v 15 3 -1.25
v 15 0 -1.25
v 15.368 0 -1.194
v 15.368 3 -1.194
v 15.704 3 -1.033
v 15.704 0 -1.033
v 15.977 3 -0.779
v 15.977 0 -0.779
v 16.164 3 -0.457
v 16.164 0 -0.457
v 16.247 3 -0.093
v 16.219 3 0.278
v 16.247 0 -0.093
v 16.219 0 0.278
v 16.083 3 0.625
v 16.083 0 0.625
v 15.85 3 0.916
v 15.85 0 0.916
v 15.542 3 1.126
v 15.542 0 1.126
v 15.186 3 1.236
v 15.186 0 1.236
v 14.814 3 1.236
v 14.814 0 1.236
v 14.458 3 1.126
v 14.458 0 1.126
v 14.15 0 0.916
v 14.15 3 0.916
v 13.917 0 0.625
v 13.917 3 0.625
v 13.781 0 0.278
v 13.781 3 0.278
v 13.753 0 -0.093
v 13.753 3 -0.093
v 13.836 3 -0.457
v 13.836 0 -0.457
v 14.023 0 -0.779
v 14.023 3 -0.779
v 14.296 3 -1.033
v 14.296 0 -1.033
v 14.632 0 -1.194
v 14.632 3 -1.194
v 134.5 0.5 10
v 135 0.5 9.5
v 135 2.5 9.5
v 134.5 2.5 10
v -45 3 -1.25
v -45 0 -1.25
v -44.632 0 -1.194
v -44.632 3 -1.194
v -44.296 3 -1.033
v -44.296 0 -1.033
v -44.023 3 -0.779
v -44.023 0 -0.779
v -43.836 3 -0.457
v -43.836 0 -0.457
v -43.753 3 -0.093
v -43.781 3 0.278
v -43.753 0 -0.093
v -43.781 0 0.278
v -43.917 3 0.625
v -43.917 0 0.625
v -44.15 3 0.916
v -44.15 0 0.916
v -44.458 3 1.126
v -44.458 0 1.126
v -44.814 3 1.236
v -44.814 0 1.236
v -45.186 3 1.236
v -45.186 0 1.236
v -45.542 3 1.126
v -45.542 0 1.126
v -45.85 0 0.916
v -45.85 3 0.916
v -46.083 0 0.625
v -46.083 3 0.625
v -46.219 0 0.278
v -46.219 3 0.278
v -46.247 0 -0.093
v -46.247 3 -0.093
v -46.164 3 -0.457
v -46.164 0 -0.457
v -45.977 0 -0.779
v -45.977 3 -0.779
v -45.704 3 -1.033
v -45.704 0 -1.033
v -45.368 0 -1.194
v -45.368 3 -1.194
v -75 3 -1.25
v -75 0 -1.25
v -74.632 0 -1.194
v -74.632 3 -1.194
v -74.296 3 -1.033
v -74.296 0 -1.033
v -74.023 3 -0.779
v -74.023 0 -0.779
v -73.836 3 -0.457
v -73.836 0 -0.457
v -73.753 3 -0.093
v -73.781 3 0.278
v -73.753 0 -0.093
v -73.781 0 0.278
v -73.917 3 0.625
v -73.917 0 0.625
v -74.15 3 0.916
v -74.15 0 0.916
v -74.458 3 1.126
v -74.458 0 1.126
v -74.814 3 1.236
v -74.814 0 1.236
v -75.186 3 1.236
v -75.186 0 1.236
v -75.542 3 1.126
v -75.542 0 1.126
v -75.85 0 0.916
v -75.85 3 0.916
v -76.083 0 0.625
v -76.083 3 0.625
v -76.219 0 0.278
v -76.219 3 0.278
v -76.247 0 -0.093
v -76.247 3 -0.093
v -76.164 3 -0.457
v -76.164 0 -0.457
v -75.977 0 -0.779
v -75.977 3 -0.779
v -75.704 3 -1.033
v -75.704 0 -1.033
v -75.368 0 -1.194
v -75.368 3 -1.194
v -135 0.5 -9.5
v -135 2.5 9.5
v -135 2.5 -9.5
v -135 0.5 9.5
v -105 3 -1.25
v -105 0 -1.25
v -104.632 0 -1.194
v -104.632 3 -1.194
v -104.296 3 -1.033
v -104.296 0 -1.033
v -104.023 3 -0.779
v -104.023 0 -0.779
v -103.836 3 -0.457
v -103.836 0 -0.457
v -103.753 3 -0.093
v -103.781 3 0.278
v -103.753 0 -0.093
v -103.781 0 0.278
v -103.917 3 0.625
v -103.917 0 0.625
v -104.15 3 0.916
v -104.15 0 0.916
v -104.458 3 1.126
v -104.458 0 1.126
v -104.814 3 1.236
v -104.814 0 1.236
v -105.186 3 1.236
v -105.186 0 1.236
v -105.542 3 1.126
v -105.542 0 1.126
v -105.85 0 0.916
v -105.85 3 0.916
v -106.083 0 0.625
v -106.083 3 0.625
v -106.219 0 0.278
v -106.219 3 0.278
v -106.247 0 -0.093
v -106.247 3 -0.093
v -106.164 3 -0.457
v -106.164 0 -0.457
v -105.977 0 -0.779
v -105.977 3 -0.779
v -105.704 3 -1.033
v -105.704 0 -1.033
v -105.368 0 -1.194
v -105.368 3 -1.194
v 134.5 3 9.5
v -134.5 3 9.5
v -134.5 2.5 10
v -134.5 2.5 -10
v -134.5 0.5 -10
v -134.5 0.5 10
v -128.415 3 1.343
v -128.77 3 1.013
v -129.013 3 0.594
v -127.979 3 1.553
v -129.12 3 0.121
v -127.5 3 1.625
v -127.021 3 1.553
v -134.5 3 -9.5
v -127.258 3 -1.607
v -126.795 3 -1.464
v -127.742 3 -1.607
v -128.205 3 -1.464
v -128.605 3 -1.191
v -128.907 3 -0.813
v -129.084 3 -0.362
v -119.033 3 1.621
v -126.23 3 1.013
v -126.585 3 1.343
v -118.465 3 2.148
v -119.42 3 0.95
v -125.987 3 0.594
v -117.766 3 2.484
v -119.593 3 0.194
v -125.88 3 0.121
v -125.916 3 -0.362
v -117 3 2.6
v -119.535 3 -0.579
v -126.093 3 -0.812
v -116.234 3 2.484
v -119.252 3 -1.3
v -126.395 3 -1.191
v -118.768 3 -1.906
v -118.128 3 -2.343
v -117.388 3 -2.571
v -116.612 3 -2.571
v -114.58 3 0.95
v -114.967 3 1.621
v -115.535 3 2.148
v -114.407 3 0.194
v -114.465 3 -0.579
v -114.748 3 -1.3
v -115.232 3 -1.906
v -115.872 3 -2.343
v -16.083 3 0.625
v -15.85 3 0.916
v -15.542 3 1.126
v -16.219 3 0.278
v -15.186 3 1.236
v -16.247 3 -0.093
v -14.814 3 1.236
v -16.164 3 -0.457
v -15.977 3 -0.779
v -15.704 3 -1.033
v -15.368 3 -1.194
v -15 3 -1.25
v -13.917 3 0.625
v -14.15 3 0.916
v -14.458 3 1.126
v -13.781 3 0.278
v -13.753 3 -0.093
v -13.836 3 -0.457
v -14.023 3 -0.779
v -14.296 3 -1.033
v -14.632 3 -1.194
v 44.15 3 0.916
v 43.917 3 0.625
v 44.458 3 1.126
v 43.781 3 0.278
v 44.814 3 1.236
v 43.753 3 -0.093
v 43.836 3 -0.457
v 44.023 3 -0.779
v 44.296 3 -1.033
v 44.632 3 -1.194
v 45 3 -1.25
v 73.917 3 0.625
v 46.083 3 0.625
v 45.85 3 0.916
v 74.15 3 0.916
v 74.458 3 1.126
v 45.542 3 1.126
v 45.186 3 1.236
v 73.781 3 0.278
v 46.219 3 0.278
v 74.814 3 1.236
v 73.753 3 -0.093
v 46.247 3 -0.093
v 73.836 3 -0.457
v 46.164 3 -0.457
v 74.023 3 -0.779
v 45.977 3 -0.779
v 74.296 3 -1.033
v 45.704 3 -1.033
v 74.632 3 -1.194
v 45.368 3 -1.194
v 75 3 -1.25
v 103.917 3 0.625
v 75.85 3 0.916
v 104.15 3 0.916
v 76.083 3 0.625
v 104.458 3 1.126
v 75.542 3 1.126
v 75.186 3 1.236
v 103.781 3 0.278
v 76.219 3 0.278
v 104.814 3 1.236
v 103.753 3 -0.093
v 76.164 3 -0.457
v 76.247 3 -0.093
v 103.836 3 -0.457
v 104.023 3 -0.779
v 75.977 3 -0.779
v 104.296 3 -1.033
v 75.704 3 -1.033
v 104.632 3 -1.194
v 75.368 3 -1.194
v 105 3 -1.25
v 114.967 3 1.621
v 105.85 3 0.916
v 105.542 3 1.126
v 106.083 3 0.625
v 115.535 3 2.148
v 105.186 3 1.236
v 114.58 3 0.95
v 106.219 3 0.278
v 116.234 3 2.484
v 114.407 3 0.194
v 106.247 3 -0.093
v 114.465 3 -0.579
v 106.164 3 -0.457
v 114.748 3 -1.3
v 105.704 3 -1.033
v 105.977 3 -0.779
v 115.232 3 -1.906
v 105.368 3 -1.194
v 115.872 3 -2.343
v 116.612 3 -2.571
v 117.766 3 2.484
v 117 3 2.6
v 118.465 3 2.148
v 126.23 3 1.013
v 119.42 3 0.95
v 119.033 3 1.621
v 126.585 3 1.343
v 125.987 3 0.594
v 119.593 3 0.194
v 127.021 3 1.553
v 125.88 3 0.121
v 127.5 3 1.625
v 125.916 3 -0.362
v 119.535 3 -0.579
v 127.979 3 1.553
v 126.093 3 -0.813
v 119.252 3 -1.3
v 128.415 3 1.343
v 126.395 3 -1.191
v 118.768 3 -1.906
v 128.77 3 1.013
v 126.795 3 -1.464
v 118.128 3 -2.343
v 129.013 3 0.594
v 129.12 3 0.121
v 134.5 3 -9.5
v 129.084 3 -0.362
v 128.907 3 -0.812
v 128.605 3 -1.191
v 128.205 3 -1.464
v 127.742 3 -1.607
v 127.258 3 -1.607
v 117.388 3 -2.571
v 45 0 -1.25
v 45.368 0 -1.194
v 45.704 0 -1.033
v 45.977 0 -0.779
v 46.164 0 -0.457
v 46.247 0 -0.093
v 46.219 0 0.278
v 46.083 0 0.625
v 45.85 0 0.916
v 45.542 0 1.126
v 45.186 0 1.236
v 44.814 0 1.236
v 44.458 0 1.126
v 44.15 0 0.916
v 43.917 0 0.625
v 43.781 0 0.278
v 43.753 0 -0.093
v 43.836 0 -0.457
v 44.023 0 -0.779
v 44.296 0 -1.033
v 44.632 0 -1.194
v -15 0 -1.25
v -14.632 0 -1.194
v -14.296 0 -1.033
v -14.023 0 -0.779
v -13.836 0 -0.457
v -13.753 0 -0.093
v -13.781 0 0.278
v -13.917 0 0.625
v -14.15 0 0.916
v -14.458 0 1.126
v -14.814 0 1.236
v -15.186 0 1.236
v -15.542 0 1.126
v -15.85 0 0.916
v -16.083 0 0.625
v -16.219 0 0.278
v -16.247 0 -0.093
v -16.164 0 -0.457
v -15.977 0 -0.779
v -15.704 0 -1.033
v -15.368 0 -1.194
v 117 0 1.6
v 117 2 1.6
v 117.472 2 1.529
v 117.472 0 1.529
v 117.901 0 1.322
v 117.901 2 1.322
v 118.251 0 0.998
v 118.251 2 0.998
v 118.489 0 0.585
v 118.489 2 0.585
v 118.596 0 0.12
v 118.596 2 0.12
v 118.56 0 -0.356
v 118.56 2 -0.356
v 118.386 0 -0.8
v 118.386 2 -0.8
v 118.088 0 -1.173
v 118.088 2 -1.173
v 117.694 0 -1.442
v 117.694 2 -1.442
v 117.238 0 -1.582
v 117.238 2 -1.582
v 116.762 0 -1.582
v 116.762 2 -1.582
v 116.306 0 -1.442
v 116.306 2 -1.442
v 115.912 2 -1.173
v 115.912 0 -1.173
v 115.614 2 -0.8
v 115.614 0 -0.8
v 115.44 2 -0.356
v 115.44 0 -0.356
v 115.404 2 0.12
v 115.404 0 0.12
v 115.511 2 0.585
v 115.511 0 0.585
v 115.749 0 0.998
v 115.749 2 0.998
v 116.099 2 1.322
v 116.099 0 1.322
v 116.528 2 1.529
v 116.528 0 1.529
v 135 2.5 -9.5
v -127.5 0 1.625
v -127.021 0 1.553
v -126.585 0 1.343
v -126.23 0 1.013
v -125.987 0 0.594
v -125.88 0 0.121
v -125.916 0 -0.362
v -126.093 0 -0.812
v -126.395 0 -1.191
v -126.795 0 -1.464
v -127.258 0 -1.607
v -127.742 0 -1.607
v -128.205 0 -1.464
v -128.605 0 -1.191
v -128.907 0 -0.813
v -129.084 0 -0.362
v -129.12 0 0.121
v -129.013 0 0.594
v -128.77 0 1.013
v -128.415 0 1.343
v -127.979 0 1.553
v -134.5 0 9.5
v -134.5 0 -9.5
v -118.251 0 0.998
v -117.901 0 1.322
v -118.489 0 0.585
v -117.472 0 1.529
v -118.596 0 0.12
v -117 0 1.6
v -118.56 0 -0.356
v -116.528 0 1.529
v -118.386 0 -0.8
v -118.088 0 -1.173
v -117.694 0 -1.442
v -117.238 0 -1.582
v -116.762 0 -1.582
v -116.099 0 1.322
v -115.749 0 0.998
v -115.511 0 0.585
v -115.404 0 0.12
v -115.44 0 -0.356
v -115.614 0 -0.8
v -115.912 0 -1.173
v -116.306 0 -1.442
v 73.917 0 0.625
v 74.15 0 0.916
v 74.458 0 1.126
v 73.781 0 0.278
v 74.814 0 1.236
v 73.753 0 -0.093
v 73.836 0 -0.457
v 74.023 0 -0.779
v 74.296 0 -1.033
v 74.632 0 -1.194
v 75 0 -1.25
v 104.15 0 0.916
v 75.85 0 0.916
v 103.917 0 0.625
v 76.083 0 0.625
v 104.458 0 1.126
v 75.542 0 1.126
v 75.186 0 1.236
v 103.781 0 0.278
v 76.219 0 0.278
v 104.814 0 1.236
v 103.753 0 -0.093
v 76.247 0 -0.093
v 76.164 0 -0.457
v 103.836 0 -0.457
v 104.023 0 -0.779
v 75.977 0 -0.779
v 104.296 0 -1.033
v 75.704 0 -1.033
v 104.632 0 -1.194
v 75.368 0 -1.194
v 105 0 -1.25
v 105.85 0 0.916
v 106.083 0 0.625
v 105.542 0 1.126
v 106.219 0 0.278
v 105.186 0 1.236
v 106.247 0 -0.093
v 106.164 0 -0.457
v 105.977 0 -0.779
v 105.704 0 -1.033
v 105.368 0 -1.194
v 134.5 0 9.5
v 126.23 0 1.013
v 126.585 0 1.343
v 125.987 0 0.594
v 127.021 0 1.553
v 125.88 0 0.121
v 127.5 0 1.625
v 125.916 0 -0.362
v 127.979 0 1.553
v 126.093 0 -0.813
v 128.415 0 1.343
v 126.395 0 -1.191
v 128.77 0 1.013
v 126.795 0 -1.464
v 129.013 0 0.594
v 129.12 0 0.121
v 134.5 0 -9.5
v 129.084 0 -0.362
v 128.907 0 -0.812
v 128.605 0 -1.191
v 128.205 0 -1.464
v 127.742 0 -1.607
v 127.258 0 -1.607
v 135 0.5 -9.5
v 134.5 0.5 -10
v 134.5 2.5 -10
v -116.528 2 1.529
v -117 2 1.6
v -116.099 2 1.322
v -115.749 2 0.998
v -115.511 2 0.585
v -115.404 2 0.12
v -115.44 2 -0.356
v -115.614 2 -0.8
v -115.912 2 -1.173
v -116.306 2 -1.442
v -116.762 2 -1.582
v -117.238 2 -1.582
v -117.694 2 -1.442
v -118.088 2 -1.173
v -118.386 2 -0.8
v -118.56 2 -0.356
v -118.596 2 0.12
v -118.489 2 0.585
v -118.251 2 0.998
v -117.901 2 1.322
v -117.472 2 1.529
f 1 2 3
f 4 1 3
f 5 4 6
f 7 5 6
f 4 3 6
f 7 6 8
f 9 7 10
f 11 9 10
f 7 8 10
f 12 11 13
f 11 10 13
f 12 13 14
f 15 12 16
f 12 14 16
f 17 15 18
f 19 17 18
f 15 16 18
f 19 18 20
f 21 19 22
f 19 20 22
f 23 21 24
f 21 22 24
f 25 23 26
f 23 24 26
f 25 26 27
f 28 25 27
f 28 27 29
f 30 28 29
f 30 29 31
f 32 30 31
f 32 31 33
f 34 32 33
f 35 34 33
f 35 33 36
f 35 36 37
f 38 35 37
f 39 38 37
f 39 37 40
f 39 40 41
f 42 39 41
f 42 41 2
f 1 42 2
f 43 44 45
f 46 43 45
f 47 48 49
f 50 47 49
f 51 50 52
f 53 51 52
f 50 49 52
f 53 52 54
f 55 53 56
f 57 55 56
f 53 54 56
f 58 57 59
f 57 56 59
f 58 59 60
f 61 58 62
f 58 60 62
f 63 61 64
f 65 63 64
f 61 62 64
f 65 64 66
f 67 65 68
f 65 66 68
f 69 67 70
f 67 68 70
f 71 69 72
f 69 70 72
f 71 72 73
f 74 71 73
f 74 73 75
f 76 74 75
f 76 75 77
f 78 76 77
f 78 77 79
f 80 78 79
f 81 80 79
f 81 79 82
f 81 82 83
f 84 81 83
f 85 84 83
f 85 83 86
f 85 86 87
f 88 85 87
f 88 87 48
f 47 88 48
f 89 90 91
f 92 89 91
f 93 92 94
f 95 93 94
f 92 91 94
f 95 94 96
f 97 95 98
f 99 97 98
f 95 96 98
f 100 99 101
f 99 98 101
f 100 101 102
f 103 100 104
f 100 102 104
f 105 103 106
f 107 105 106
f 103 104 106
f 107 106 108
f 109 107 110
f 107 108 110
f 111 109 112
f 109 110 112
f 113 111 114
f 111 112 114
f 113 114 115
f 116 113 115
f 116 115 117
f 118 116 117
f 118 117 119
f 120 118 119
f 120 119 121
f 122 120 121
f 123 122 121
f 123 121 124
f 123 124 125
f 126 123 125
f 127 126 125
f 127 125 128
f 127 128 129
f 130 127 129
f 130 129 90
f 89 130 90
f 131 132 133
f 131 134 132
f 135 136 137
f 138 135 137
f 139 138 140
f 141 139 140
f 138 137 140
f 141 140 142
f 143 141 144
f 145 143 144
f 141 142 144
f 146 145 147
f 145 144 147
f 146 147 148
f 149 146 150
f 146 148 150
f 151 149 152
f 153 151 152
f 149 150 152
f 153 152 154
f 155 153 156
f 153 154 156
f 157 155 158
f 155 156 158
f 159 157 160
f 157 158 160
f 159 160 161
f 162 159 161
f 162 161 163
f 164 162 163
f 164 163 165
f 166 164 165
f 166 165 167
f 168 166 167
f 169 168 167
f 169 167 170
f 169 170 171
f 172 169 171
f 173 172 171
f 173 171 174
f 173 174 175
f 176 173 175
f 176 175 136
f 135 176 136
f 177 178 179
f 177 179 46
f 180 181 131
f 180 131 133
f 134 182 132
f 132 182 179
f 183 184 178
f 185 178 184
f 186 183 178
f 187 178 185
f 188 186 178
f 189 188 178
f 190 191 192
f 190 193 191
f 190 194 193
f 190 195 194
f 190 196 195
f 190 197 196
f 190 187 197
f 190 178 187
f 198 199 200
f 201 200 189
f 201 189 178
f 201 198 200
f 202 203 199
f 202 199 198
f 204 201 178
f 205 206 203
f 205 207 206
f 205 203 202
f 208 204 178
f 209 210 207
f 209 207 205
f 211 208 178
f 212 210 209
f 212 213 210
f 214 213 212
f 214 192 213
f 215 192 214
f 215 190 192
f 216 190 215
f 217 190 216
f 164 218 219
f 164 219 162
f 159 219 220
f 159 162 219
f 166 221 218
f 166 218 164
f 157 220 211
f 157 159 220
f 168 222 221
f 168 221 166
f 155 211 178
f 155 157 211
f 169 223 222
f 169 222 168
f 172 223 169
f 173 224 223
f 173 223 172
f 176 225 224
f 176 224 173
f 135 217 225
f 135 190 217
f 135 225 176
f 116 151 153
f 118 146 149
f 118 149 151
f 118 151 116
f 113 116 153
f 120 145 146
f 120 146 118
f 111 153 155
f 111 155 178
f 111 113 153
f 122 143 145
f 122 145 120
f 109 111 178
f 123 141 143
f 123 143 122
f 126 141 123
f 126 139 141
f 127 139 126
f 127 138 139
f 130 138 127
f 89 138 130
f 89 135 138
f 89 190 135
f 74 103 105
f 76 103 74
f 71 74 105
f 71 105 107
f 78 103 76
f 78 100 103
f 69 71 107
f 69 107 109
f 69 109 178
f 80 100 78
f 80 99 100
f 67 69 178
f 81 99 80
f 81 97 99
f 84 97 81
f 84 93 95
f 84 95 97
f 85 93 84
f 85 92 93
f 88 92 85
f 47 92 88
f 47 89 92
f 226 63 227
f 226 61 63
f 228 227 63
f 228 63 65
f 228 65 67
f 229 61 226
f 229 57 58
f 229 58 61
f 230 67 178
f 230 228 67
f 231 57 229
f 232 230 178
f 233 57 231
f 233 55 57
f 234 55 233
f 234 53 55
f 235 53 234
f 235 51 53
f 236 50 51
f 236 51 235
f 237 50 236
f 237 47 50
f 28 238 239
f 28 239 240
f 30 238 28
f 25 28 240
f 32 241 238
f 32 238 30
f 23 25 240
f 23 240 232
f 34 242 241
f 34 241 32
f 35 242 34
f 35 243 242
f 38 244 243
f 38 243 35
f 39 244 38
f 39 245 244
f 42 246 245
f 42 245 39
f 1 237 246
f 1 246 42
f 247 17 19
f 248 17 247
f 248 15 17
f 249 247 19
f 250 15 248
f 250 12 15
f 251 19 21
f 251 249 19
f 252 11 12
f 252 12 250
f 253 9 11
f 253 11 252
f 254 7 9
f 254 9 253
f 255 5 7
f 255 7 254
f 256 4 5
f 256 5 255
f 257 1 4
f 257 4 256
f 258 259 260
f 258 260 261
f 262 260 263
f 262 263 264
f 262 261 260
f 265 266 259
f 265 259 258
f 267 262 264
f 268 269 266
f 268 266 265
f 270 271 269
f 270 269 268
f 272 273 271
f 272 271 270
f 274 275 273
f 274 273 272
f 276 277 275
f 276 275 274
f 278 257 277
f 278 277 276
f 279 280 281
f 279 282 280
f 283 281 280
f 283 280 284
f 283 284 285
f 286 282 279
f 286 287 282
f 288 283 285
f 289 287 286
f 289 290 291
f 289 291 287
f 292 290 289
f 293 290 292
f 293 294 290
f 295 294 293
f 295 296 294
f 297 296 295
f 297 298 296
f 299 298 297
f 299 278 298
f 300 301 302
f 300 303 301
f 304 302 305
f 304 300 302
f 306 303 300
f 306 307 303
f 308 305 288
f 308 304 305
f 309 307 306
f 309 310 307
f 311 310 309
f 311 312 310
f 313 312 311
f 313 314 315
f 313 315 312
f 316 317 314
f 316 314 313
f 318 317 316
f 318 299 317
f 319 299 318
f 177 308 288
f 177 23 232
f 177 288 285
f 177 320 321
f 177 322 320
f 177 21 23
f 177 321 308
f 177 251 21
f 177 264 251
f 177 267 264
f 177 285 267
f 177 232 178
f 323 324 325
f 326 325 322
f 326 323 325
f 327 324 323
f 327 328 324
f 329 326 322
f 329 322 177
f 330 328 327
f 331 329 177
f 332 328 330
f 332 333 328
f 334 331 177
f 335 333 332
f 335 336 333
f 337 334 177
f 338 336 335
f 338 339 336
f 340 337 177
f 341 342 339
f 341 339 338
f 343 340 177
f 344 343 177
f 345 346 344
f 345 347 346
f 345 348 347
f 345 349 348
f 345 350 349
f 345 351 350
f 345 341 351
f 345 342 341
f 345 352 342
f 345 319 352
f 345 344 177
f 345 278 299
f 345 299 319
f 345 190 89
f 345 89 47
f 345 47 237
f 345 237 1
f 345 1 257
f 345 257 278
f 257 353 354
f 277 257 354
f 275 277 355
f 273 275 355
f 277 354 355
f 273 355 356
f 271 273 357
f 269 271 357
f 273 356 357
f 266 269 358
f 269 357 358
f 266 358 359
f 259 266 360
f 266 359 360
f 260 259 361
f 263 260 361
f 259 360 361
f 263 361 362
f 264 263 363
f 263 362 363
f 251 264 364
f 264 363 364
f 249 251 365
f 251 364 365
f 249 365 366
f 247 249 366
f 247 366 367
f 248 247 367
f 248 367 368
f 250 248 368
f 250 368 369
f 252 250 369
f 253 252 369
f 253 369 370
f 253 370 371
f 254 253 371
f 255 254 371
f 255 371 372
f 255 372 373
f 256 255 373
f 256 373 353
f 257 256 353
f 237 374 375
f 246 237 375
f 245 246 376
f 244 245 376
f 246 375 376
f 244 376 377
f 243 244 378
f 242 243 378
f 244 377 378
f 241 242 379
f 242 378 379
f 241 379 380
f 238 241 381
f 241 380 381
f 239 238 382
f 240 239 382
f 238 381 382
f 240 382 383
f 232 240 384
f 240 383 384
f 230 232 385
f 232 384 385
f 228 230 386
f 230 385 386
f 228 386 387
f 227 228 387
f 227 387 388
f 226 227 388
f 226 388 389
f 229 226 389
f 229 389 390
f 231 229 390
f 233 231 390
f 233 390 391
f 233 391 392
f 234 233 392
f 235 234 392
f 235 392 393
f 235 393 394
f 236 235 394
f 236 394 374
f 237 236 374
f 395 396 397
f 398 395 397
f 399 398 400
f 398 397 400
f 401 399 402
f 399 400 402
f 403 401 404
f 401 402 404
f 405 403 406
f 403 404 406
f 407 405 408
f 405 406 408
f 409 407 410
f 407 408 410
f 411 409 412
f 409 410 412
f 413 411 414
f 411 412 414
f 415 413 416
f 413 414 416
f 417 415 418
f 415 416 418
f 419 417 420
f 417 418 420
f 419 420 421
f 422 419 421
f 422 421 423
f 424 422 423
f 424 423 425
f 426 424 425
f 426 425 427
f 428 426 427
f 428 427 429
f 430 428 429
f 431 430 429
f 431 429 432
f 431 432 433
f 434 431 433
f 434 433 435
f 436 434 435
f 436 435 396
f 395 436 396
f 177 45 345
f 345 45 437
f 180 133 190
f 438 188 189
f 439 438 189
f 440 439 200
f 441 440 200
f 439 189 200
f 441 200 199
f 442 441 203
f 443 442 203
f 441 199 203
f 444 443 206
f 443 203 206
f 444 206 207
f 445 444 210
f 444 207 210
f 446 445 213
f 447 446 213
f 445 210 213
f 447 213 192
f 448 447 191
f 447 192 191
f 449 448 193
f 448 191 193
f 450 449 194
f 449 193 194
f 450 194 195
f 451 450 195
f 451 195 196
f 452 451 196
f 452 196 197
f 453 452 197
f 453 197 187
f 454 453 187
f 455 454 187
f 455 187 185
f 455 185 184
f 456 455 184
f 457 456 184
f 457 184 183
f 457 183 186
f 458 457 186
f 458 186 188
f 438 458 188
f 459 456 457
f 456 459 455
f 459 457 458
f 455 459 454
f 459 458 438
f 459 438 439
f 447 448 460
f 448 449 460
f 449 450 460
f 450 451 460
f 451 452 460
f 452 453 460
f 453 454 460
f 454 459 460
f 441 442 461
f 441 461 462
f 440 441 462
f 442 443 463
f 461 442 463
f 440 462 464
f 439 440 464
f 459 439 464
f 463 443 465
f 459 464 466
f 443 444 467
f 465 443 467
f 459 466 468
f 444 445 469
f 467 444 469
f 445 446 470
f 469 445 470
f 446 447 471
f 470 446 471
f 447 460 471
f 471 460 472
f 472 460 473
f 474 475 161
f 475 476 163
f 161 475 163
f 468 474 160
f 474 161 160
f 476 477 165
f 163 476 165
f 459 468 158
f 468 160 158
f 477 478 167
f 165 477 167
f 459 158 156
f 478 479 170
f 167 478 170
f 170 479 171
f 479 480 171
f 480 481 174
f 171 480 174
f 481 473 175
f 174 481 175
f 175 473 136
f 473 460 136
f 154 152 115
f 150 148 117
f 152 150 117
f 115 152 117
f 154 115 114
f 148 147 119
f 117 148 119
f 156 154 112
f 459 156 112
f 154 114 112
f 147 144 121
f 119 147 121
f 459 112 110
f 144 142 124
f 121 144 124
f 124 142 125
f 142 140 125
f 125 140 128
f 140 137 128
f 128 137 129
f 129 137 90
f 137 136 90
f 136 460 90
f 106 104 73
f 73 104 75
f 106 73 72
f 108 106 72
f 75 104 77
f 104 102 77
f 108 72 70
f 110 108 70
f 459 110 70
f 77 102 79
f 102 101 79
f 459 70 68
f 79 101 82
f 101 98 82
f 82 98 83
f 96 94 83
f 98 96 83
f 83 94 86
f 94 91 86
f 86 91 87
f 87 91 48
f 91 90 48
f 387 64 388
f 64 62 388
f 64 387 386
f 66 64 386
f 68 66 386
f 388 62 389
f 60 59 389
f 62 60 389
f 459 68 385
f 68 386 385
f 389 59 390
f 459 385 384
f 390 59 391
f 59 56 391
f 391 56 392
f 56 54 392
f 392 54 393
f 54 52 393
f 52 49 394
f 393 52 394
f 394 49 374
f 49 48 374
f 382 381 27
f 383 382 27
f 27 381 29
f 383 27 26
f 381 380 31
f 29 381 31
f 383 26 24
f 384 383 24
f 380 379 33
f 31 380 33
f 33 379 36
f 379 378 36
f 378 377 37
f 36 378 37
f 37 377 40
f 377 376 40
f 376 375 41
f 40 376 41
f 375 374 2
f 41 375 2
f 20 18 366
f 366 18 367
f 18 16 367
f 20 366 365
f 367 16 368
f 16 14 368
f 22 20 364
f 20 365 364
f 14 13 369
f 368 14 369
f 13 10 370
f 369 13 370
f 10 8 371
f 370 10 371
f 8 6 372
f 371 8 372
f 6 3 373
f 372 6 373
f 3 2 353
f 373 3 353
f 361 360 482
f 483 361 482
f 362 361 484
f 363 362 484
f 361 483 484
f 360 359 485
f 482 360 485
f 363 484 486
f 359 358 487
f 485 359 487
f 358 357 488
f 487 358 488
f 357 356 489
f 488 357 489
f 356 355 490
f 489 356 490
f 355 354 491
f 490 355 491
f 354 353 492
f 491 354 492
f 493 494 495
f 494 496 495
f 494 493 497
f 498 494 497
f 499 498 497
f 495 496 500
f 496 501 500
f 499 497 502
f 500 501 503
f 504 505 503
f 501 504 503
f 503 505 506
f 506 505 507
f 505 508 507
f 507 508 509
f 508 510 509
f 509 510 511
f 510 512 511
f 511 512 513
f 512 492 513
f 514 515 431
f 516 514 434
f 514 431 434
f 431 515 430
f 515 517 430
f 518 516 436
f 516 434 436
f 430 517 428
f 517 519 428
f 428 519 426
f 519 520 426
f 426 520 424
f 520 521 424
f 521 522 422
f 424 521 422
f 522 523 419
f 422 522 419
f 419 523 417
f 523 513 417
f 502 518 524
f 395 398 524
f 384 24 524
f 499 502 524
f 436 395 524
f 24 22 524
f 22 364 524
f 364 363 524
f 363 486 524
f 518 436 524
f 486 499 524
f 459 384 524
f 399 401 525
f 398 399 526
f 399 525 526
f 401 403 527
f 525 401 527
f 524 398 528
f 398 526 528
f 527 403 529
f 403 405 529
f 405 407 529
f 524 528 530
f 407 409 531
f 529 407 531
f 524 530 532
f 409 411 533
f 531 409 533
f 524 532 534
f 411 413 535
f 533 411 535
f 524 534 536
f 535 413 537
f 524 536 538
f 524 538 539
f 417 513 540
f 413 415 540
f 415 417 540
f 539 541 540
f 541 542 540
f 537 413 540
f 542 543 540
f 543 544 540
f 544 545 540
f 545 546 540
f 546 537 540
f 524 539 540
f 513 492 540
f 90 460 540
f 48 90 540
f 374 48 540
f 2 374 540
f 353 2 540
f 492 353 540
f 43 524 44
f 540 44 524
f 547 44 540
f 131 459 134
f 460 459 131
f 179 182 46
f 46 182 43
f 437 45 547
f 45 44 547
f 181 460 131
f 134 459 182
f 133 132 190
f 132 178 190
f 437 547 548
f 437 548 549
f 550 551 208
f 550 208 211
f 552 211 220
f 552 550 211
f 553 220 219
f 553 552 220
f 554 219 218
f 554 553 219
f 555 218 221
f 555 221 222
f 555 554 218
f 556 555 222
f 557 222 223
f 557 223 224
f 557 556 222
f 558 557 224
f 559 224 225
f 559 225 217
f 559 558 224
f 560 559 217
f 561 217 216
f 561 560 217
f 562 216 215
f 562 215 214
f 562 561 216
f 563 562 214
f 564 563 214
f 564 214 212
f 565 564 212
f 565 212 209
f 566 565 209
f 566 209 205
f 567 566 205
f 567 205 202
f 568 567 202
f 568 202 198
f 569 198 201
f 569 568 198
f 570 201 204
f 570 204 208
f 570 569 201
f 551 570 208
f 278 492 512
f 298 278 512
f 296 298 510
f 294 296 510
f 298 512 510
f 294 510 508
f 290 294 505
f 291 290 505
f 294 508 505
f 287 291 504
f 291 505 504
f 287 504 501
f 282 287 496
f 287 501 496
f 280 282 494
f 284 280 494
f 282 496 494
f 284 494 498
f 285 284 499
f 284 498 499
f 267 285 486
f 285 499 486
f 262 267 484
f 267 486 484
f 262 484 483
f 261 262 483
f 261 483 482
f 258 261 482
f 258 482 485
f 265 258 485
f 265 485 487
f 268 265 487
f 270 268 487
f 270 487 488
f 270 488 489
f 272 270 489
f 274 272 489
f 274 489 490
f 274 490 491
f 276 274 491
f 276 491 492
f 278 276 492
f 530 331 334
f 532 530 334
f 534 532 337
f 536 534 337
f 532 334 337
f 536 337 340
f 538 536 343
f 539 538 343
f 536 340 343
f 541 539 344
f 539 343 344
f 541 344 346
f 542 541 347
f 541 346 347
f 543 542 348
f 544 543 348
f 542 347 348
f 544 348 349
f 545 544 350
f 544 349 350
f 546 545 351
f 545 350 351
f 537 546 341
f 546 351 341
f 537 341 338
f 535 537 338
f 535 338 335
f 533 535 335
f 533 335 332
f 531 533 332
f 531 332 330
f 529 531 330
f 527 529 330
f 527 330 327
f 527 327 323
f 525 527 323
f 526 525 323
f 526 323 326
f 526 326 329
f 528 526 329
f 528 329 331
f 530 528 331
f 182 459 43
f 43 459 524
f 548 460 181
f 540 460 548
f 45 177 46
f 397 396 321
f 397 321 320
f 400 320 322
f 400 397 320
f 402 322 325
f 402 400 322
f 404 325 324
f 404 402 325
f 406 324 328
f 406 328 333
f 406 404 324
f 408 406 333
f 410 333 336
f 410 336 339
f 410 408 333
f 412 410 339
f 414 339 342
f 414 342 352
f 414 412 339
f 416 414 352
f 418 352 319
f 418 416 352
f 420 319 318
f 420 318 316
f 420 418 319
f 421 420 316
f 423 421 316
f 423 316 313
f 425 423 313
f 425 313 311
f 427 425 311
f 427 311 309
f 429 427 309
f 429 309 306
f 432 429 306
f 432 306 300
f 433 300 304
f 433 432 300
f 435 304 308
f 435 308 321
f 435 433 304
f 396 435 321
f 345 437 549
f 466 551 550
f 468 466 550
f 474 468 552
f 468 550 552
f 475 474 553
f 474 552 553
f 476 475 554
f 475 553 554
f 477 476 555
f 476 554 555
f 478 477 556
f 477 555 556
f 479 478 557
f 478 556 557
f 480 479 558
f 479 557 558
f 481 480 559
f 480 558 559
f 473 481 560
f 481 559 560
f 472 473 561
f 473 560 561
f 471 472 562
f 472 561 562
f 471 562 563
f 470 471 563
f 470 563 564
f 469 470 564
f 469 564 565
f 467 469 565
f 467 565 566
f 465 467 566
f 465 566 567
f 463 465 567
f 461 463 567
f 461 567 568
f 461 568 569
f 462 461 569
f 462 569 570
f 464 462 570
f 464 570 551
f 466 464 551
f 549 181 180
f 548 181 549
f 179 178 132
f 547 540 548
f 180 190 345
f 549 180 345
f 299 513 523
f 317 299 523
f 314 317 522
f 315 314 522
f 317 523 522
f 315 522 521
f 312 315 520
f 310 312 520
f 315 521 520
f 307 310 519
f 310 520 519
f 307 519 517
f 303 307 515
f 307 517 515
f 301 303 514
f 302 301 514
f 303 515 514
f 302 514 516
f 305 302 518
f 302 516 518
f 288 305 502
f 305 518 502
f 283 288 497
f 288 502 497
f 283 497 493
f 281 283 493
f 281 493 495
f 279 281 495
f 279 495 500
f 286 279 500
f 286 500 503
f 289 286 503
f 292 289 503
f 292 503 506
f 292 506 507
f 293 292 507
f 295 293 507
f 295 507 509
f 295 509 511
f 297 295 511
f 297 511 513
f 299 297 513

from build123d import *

# Parameters (mm, degrees)
SKETCH1_W           = 270
SKETCH1_H           = 20
BOSS_EXTRUDE1_DEPTH = 3
M3_TAPPED_HOLE1_D   = 2.5
SKETCH4_R           = 1.625
CUT_EXTRUDE1_DEPTH  = 136.403101885
CHAMFER1_SIZE       = 0.5
SKETCH5_R           = 1.6
CUT_EXTRUDE2_DEPTH  = 136.403101885
CHAMFER2_SIZE       = 1


with BuildPart() as part:
    # Sketch1 → Boss-Extrude1 (new body)
    with BuildSketch(Plane(origin=(0, 0, 0), x_dir=(1, 0, 0), z_dir=(0, 1, 0))):
        Rectangle(SKETCH1_W, SKETCH1_H)
    extrude(amount=BOSS_EXTRUDE1_DEPTH)

    # M3 Tapped Hole1 (through all)
    with Locations(Plane(origin=(-105, 3, 0), x_dir=(0, 0, 1), z_dir=(0, 1, 0))):
        with Locations((0, 0), (0, 30), (0, 60), (0, 90), (0, 120), (0, 150), (0, 180), (0, 210)):
            Hole(M3_TAPPED_HOLE1_D / 2)

    # Sketch4 → Cut-Extrude1 (cut, through all)
    with BuildSketch(Plane(origin=(0, 3, 0), x_dir=(1, 0, 0), z_dir=(0, 1, 0))):
        with Locations(Location((-127.5, 0, 0), (0, 0, 270))):
            Circle(SKETCH4_R)
        with Locations(Location((127.5, 0, 0), (0, 0, 270))):
            Circle(SKETCH4_R)
    extrude(amount=-CUT_EXTRUDE1_DEPTH, mode=Mode.SUBTRACT)

    # Chamfer1
    chamfer1_edges = [part.edges().sort_by_distance(p)[0] for p in [
        (-135, 3, 0),
        (0, 3, 10),
        (135, 3, 0),
        (0, 0, 10),
        (-135, 0, 0),
        (0, 0, -10),
        (135, 0, 0),
        (135, 1.5, 10),
        (-135, 1.5, 10),
        (-135, 1.5, -10),
        (135, 1.5, -10),
        (0, 3, -10),
    ]]
    chamfer(chamfer1_edges, length=CHAMFER1_SIZE)

    # Sketch5 → Cut-Extrude2 (cut, through all)
    with BuildSketch(Plane(origin=(0, 3, 0), x_dir=(1, 0, 0), z_dir=(0, 1, 0))):
        with Locations(Location((-117, 0, 0), (0, 0, 270))):
            Circle(SKETCH5_R)
        with Locations(Location((117, 0, 0), (0, 0, 270))):
            Circle(SKETCH5_R)
    extrude(amount=-CUT_EXTRUDE2_DEPTH, mode=Mode.SUBTRACT)

    # Chamfer2
    chamfer2_edges = [part.edges().sort_by_distance(p)[0] for p in [
        (-117, 3, -1.6),
        (117, 3, -1.6),
    ]]
    chamfer(chamfer2_edges, length=CHAMFER2_SIZE)


solid = part.part
